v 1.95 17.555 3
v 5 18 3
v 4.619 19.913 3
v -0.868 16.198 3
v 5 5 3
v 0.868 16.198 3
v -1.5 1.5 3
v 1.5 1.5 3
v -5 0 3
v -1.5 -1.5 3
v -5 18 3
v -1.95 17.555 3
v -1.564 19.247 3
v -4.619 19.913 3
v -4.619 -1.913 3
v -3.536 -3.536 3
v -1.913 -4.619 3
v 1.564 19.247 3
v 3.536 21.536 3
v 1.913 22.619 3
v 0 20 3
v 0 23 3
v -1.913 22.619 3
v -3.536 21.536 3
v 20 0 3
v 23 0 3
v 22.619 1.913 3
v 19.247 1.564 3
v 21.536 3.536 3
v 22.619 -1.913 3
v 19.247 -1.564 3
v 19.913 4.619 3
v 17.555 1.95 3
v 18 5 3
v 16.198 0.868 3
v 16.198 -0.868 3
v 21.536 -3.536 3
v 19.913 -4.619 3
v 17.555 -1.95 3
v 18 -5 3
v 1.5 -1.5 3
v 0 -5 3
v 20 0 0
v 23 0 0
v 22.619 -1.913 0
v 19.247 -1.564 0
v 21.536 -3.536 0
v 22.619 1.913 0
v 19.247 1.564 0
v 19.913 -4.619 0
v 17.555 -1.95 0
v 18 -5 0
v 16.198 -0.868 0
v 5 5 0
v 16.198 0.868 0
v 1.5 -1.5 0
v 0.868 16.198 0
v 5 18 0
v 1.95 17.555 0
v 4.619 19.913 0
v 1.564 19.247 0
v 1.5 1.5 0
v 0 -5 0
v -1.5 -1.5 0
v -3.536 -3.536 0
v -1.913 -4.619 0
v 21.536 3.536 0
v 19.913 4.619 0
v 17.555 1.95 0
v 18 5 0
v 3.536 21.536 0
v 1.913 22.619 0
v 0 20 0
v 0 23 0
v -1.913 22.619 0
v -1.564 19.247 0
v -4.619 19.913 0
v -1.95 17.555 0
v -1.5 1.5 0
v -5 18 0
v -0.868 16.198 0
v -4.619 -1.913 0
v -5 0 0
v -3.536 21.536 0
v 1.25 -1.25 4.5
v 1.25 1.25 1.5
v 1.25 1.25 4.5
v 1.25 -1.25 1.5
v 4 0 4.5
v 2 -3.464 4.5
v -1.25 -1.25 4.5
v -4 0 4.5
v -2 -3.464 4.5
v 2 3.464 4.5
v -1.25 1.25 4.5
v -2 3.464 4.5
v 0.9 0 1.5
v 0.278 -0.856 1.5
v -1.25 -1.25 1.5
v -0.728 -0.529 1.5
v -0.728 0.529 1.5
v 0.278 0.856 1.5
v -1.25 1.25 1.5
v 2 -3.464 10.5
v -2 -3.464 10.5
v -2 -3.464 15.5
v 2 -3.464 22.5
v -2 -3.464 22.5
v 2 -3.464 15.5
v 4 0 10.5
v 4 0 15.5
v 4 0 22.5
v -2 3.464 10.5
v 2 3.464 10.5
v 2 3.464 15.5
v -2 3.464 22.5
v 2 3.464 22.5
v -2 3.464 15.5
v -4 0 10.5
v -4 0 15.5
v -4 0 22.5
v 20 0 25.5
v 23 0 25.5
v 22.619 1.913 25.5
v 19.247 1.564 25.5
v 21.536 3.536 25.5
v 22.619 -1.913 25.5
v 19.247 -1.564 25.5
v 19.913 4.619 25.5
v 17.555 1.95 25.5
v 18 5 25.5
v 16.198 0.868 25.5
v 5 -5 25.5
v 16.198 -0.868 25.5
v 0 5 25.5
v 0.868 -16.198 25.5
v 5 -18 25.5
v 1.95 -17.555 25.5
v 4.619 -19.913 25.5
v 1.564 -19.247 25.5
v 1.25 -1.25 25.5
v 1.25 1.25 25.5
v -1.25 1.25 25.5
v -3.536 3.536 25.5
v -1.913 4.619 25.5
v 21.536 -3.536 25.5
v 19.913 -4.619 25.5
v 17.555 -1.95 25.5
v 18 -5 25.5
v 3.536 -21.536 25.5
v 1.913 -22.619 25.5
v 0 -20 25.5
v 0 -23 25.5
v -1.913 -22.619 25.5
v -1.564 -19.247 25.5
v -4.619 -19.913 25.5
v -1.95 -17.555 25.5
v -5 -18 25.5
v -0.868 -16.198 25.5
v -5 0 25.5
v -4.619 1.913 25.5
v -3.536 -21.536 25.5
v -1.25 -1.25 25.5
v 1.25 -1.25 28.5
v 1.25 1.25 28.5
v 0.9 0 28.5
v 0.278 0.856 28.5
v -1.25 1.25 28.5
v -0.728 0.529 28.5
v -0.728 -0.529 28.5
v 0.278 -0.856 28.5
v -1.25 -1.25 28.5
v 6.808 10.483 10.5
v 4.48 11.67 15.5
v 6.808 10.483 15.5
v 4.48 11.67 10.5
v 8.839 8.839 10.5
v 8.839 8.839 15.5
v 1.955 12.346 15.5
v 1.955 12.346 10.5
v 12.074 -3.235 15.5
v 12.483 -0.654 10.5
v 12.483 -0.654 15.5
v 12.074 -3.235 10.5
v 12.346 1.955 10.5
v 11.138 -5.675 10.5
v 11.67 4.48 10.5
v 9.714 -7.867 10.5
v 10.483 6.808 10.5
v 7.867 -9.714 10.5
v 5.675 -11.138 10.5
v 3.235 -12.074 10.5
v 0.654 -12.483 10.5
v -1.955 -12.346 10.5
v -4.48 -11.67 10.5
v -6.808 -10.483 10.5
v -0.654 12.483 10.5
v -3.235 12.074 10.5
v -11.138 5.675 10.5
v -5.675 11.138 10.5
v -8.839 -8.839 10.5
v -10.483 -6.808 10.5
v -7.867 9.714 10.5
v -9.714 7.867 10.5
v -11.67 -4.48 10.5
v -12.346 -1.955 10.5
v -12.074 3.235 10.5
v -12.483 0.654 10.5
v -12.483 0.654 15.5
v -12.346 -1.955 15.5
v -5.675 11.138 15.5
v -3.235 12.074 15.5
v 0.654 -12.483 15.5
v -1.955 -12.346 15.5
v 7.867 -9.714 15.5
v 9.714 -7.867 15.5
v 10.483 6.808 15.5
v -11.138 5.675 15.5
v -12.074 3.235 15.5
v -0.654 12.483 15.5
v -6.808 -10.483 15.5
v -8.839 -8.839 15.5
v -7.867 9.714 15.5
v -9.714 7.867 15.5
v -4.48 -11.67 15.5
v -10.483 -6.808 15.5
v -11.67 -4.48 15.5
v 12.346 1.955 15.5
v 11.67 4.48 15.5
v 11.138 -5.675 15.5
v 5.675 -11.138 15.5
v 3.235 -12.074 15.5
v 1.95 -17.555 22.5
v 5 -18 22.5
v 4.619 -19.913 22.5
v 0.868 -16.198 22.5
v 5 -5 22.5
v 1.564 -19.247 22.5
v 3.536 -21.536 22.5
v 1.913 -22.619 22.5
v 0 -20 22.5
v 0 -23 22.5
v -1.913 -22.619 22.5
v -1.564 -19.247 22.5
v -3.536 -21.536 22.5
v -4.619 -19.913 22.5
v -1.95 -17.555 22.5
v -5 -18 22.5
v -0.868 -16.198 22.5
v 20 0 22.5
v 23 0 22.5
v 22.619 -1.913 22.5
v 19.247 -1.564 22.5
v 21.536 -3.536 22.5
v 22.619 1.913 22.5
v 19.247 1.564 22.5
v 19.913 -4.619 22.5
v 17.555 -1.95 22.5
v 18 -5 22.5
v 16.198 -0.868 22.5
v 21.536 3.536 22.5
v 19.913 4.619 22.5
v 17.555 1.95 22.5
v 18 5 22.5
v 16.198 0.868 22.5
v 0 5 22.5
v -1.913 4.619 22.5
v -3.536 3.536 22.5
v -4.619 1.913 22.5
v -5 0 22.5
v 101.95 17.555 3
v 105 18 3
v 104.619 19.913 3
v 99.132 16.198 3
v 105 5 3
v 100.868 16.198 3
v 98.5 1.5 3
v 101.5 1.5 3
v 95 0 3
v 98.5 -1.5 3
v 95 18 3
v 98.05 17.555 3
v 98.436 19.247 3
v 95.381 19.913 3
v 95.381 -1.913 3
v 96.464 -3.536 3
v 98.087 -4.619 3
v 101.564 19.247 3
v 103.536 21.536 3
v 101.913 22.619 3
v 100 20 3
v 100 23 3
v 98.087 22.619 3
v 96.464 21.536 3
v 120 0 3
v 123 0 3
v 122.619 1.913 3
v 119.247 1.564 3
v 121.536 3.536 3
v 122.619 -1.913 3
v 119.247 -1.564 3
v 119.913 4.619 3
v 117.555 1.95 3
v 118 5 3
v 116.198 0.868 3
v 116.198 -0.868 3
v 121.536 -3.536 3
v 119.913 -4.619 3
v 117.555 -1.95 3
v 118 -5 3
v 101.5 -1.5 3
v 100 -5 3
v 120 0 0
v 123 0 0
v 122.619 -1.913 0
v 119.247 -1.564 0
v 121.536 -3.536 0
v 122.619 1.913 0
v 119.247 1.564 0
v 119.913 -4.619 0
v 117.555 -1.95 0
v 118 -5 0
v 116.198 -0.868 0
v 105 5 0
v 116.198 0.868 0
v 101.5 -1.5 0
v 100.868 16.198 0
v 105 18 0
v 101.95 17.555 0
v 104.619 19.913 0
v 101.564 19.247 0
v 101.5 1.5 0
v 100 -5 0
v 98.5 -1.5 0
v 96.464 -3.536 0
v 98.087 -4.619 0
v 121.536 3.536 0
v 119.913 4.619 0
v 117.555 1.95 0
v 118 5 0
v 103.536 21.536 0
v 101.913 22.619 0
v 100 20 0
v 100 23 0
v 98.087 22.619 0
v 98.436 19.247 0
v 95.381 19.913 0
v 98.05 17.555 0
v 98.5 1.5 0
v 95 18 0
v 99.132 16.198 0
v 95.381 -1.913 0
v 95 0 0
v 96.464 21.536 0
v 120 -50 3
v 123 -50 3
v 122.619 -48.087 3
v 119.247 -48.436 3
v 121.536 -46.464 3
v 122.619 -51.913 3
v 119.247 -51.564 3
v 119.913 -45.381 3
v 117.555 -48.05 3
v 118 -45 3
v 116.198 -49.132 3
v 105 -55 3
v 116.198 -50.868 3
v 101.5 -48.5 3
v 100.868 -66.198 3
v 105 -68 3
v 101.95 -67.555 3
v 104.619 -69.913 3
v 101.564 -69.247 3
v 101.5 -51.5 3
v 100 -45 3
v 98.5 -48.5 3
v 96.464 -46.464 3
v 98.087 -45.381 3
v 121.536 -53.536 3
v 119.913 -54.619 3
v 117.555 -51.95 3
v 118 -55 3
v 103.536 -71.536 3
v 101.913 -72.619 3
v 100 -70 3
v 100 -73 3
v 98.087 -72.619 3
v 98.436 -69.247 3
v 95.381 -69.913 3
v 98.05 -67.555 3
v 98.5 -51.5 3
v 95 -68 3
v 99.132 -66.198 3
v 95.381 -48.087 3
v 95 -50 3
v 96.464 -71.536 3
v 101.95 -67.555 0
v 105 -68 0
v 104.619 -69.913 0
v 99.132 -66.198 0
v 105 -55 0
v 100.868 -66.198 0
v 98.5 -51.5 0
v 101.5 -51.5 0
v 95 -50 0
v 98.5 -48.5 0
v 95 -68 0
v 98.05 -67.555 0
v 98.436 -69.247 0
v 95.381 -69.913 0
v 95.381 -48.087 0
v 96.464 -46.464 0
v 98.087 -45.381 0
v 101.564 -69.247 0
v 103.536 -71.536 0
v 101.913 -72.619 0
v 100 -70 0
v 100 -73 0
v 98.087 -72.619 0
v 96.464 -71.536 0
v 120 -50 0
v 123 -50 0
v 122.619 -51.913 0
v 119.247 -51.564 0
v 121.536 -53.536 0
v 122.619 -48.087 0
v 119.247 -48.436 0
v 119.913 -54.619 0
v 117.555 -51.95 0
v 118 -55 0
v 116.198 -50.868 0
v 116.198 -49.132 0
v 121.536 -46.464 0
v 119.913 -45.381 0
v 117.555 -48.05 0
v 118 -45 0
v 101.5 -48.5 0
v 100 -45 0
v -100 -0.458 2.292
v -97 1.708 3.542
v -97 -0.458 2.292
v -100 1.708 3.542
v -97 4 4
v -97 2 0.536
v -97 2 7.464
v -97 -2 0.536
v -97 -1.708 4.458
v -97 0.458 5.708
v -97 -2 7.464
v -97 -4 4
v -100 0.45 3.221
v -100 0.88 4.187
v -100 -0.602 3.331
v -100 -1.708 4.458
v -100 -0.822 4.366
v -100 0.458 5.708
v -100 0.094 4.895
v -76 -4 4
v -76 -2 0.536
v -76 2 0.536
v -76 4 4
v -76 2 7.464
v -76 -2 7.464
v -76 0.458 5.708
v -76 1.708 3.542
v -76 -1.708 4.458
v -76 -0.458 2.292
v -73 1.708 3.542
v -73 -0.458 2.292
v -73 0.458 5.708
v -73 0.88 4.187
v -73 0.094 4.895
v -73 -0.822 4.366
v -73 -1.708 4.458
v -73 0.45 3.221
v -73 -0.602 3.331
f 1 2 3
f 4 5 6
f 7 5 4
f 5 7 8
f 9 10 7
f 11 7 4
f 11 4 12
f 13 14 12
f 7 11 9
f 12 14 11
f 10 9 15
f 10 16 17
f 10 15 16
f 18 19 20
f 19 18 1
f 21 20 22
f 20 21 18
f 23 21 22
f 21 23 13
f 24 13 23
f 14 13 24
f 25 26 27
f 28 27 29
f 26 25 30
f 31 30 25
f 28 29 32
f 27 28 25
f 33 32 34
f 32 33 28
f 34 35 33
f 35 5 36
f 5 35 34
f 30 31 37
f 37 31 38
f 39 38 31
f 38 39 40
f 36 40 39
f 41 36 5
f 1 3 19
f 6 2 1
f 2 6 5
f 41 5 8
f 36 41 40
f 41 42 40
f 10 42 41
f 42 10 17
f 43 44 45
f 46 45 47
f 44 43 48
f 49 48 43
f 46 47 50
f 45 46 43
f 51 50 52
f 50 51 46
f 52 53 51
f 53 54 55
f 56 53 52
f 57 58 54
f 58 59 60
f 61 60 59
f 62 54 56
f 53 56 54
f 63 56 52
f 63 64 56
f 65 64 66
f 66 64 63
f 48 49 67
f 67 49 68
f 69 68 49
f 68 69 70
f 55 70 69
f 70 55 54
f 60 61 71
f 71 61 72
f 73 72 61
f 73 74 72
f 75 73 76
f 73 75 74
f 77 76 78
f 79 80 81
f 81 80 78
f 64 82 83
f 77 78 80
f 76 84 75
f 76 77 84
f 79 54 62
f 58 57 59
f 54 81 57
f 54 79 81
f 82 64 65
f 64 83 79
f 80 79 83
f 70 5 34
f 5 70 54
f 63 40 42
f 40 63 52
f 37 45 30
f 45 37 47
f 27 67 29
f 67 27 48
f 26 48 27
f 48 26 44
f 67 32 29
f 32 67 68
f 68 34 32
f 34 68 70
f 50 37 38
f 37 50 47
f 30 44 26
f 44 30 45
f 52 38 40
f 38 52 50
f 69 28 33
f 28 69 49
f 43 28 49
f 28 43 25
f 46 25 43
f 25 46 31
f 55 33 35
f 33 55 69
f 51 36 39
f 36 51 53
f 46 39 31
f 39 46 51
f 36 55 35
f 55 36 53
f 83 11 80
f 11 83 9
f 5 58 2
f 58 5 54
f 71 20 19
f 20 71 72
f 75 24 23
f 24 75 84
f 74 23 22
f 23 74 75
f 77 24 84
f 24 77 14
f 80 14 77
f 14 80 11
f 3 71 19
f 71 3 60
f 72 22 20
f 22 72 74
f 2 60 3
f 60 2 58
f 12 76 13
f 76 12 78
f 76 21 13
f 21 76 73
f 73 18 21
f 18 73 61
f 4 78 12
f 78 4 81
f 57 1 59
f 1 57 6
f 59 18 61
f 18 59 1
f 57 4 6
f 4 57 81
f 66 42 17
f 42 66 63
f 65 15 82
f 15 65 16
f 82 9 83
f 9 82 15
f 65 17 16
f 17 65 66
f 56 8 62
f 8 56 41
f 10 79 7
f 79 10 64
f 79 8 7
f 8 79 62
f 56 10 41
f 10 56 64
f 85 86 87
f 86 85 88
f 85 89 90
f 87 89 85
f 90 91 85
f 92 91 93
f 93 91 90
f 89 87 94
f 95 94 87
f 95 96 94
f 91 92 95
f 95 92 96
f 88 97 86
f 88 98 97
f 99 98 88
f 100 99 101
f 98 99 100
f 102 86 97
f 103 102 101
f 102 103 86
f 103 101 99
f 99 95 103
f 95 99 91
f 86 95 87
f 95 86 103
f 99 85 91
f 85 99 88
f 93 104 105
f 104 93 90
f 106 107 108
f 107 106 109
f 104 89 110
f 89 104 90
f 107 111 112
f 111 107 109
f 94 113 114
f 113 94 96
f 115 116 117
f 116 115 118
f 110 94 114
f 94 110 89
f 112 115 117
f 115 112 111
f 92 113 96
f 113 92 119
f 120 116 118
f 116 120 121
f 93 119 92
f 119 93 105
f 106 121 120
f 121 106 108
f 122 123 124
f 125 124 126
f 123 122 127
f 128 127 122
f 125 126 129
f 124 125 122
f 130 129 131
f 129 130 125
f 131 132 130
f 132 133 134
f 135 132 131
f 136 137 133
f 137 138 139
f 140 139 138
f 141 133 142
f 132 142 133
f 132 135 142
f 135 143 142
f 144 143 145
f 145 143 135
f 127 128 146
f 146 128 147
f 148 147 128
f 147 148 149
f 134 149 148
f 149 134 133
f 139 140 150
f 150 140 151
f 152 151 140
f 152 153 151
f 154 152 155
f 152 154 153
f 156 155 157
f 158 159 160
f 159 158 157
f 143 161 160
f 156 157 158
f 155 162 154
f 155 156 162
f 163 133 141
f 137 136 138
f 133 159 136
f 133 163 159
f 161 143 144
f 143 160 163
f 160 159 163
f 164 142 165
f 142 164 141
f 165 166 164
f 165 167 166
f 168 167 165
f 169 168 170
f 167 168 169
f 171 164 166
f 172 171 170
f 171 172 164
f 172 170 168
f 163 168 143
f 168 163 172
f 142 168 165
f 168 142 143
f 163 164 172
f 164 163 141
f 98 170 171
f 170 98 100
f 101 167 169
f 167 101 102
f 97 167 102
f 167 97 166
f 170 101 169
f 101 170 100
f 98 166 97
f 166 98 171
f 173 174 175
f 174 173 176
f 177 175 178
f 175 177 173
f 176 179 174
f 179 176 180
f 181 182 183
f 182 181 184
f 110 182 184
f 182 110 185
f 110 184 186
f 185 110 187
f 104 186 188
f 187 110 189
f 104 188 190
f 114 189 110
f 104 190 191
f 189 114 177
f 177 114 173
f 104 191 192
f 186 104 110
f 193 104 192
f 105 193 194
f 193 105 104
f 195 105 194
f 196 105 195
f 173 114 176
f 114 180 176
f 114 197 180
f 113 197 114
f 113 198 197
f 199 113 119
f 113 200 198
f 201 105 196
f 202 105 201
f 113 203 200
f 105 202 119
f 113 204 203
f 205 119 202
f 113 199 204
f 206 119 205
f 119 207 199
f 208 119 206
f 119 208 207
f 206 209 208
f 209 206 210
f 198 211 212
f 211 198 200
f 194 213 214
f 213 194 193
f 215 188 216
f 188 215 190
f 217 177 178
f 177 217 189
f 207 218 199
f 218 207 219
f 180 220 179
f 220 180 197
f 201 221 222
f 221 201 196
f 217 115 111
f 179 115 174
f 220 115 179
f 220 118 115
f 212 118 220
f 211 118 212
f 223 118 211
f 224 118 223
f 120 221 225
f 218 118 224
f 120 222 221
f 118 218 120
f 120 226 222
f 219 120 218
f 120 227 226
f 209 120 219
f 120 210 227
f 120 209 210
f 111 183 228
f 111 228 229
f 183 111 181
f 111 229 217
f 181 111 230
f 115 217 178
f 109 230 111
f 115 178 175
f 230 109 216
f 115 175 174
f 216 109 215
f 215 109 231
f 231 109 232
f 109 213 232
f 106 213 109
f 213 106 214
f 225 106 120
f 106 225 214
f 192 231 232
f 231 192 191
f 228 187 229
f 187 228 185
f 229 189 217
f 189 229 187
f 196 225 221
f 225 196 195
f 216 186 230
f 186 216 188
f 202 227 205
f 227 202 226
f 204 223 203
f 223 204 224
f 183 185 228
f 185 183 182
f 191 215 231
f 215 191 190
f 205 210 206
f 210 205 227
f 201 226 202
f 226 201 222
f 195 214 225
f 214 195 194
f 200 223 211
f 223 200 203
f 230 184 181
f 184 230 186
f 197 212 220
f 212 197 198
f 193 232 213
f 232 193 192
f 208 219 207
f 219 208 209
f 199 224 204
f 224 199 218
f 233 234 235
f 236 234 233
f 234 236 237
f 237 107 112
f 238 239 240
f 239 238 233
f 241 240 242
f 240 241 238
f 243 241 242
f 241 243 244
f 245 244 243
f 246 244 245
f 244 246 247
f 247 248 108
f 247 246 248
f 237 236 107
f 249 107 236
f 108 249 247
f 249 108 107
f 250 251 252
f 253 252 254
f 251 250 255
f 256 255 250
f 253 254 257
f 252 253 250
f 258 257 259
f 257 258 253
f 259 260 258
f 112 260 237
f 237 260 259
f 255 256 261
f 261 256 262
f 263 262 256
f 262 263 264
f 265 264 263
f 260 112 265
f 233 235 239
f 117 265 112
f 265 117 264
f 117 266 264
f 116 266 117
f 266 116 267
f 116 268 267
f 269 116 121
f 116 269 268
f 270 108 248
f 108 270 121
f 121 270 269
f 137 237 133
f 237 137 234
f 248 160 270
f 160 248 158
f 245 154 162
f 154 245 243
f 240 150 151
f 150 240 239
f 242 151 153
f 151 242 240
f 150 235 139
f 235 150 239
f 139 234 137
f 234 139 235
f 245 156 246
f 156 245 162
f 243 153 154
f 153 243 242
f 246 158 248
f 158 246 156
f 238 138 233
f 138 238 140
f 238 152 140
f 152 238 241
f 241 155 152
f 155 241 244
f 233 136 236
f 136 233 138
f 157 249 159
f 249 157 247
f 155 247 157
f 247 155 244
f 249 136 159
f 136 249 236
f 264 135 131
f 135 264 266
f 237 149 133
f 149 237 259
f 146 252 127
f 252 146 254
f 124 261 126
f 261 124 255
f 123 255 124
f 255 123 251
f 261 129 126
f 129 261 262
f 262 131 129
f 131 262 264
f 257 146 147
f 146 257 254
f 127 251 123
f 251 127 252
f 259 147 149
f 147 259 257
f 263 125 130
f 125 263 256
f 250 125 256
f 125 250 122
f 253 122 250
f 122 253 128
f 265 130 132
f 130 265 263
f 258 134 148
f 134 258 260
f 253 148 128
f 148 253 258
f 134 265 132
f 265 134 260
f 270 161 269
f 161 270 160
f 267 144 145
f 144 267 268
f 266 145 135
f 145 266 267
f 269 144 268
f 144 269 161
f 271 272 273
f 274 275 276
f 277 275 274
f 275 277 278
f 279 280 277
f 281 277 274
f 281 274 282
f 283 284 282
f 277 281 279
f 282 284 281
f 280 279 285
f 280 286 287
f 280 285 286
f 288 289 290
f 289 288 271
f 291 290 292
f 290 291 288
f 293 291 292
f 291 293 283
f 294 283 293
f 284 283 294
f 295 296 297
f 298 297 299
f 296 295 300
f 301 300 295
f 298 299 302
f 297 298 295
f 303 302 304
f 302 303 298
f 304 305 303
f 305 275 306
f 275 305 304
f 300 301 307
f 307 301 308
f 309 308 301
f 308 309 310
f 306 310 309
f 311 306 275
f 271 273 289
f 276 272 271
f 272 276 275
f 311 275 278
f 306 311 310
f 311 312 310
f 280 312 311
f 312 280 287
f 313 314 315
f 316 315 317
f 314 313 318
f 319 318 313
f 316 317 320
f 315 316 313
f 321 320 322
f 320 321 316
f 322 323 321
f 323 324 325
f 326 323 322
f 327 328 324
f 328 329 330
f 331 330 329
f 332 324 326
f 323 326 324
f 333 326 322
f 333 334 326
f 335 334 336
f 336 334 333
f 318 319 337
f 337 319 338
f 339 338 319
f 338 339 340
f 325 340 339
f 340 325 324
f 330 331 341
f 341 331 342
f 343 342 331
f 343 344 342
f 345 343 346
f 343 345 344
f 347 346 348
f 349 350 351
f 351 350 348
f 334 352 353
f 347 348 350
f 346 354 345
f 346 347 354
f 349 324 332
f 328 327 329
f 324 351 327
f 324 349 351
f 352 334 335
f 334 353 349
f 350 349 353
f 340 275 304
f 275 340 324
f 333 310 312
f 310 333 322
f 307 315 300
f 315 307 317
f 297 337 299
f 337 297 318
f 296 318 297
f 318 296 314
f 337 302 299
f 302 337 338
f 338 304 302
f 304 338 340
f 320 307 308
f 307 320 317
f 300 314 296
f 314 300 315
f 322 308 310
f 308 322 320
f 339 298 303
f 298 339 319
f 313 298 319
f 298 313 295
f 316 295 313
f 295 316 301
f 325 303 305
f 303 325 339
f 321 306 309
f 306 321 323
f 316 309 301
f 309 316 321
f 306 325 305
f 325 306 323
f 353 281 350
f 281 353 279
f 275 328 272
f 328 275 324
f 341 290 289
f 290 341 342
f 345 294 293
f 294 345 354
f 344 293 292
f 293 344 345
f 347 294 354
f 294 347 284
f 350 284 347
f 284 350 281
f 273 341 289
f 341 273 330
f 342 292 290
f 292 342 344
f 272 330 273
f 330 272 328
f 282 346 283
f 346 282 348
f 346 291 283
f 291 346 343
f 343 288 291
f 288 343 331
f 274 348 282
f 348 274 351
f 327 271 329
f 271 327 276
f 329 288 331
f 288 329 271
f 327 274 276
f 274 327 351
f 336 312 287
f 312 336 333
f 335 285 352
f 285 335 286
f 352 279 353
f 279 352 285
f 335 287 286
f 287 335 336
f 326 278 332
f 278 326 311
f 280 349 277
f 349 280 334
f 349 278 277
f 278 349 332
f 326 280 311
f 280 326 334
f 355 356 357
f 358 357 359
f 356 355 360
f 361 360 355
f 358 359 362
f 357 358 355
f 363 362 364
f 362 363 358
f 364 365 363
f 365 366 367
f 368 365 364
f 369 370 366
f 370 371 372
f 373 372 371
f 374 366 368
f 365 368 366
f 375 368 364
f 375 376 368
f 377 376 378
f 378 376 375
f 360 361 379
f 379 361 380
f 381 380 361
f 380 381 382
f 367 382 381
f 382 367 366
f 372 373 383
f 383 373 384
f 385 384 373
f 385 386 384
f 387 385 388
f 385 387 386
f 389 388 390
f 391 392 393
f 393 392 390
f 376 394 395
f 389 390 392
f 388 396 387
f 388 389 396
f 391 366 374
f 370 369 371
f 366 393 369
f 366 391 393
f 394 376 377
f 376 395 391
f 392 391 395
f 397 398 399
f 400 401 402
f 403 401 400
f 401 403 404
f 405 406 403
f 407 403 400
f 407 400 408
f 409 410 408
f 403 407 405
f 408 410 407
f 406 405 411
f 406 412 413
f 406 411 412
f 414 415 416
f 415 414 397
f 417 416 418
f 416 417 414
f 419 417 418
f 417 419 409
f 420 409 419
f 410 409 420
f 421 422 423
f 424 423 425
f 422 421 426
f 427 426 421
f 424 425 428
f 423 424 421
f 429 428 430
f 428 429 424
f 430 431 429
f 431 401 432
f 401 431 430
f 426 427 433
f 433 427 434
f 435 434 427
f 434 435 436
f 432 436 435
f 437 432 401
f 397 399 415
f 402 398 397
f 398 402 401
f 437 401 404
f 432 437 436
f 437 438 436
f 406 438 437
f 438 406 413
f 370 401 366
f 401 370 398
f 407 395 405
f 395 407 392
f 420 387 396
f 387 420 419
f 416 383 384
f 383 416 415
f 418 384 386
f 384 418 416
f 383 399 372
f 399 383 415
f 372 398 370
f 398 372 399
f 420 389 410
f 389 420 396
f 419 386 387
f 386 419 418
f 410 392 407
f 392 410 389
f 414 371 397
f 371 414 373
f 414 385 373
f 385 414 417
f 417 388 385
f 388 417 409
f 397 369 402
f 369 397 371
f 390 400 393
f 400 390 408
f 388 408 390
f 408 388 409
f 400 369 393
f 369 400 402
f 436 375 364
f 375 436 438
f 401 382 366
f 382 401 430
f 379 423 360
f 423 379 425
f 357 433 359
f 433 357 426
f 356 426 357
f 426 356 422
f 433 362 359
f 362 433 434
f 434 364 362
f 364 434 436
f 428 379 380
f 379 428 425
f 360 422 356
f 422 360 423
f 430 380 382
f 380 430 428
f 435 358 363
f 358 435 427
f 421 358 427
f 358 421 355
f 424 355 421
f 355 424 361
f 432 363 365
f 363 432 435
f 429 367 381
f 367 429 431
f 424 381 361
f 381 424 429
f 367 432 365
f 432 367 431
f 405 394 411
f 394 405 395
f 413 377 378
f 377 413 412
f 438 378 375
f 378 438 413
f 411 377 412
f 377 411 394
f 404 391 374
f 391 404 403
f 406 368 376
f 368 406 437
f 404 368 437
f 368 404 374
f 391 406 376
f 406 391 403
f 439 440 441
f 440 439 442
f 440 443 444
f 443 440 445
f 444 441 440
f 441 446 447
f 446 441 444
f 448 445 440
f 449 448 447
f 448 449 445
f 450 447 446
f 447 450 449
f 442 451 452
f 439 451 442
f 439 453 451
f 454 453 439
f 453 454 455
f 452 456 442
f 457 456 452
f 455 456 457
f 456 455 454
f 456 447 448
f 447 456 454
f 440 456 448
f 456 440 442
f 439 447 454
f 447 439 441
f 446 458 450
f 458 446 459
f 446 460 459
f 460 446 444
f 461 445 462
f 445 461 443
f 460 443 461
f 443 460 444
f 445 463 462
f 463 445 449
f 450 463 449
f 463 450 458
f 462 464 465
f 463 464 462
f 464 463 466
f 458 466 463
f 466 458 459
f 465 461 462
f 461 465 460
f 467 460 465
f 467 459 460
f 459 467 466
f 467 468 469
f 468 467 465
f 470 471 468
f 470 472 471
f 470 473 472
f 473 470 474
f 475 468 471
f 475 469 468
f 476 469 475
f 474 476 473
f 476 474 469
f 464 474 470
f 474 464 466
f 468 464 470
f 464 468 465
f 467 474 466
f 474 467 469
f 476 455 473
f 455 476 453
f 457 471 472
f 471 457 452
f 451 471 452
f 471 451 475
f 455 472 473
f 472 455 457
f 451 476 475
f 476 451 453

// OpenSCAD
// file: ModuleKatzenklappe.scad
// //////////////////////////////////
// Module für Katzenklappenverschluss
// //////////////////////////////////

module armHorn (laenge, breite, dicke) {
    difference() {
    union() {
    translate ([0,-breite/2,0])
    cube([laenge,breite,dicke], false);
    translate ([laenge,0,0])
    cylinder(dicke,r=breite/2, false); 
    }
    translate ([laenge*1.0,0,0])
    loch(radius=2,tiefe= dicke + 1);
/*    translate ([laenge*0.6,0,dicke-1])
    letter("Achim");
    translate ([laenge*0.6,0,1])
    rotate([0,180,0])
    letter("Tim");
    translate ([laenge*0.2,0,0])
    loch(radius=2,tiefe= dicke + 1);
*/    }
};

module mittelRad (breite) {
    difference() {
        cylinder(breite,r=12.5, false);
        cylinder(breite,r=2.0, false);
        
/*        translate([0,0,breite])
        gear (
            toothNo = 100, 
            toothWidth = 1, 
            toothHeight  = 2, 
            thickness = breite,
            holeRadius = 5,
            holeSides = 6
        );
        translate ([-25,0,0])
        loch(radius=5,tiefe=breite + 1);
        translate ([25,0,0])
        loch(radius=5,tiefe=breite + 1);
        translate ([0,-25,0])
        loch(radius=5,tiefe=breite + 1);
        translate ([0,25,0])
        loch(radius=5,tiefe=breite + 1);
*/        } 
};

module loch (radius, tiefe) {
        cylinder(tiefe,r=radius, false);   
};

module zapfen (breite,tiefe) {
        cube([breite,breite,tiefe], true);   
};

module wand (breite) {
    difference() {
        cube([breite,120,5], false);  
        translate ([5,5,0])
        cube([breite/3-10,110,5], false);  
        translate ([breite/3+5,5,0])
        cube([breite/3-10,110,5], false);  
        translate ([2*breite/3+5,5,0])
        cube([breite/3-10,110,5], false);  
    } 
};

module lArm(laenge, breite, dicke) {
    difference() {
        union() {
            armHorn(laenge=laenge, breite=breite, dicke=dicke);
            rotate(90) armHorn(laenge=laenge, breite=breite, dicke=dicke);
            cylinder(dicke,r=breite/2, false); 
           }
            translate ([0,0,0])
            zapfen(breite= 3, tiefe = dicke * 2);
        }
};

module mittelAchse(laenge, radius_achse, zapfen_breite, zapfen_laenge, breite) {
    difference() {
        union() {
            translate ([0,0,zapfen_laenge /2])
            zapfen(breite= zapfen_breite, tiefe=zapfen_laenge);   
            translate ([0,0,zapfen_laenge])
            cylinder(laenge,r = radius_achse, false, $fn=6);
            translate ([0,0,laenge+(1.5*zapfen_laenge)])
            zapfen(breite= zapfen_breite, tiefe=zapfen_laenge);   
        }
        cylinder (laenge+6,r=0.9, false);
    }
};

module achse(laenge, radius_achse) {
    difference() {
        cylinder(laenge,r = radius_achse, false, $fn=6);
        cylinder (laenge+6,r=0.9, false);
    }
};


module tooth(width, thickness, height){
  scale([width/5,thickness/5,height/10]){
    difference(){
      translate([-2.5,0,0])
      cube([5,5,10]);
      translate([5+1.25-2.5,0-1,0])
      rotate([0,-14.0362434,0])
        cube([5,5+2,12]);
      translate([0-1.25-2.5,0+5+1,0])
      rotate([0,-14.0362434,180])
        cube([5,5+2,12]);
    }
  }
}
module gear(toothNo, toothWidth, toothHeight, thickness,holeRadius,holeSides){
  radius = (toothWidth*1.7*toothNo)/3.141592653589793238/2;
  rotate([-90,0,0])
  difference(){
    union(){
      for(i=[0:toothNo]){
        rotate([0,(360/toothNo)*i,0])
        translate([0,0,radius-0.5])
          tooth(toothWidth,thickness,toothHeight);
      }
      translate([0,thickness,0])
      rotate([90,0,0])
        cylinder(r=radius, h=thickness);
    }
  translate([0,thickness+1,0])
  rotate([90,0,0])
    cylinder(r=holeRadius,h=thickness+2,$fn=holeSides);
  }
}

font = "Liberation Sans";


letter_size = 5;
letter_height = 3;


module letter(l) {
  // Use linear_extrude() to make the letters 3D objects as they
  // are only 2D shapes when only using text()
  linear_extrude(height = letter_height) {
    text(l, size = letter_size, font = font, halign = "center", valign = "center", $fn = 16);
  }
}


module 9g_motor(){
	difference(){			
		union(){
			color("SteelBlue") cube([23,12.5,22], center=true);
			color("SteelBlue") translate([0,0,5]) cube([32,12,2], center=true);
			color("SteelBlue") translate([5.5,0,2.75]) cylinder(r=6, h=25.75, $fn=20, center=true);
			color("SteelBlue") translate([-.5,0,2.75]) cylinder(r=1, h=25.75, $fn=20, center=true);
			color("SteelBlue") translate([-1,0,2.75]) cube([5,5.6,24.5], center=true);		
			color("white") translate([5.5,0,3.65]) cylinder(r=2.35, h=29.25, $fn=20, center=true);				
		}
		translate([10,0,-11]) rotate([0,-30,0]) cube([8,13,4], center=true);
		for ( hole = [14,-14] ){
			translate([hole,0,5]) cylinder(r=2.2, h=4, $fn=20, center=true);
		}	
	}
}

module sg90() {
	color("blue") difference() {
		union() {
			translate([0,0,22.5/2]) cube([22.5,12.2,22.5], center=true);
			translate([0,0,16.75]) cube([32.2,12.2,2], center=true);

			translate([0,0,22.5-1]) {
				hull() {
					translate([-1,0,0]) cylinder(d=5.5, h=4+1);
					translate([1,0,0]) cylinder(d=5.5, h=4+1);
				}

				translate([5.5,0,0]) cylinder(d=11.6, h=4+1);
			}

		}	

		translate([-32.5/2+2,0,16.75-2]) {
			cylinder(d=2, h=2+2);
			translate([-2,0,2]) cube([4,1,2+2], center=true);
		}
		translate([32.5/2-2,0,16.75-2]) {
			cylinder(d=2, h=2+2);
			translate([2,0,2]) cube([4,1,2+2], center=true);
		}
	}
	color("white") translate([5.5,0,22.5-1+4]) {
		difference() {
			cylinder(d=4.8, h=3+1);
			translate([0,0,1]) cylinder(d=2, h=4);
		}
	}
}

module stuetze (hoehe) {
    difference() {
        translate ([0,0,0])
        cube([hoehe,20,3], false);
        translate ([hoehe*0.8,10,0])
        cylinder(21,r=1.5, center=true);
        translate ([hoehe*0.7,10,0])
        cylinder(21,r=1.5, center=true);
        translate ([hoehe*0.6,10,0])
        cylinder(21,r=1.5, center=true);
        translate ([hoehe*0.5,10,0])
        cylinder(21,r=1.5, center=true);
    }
}

module balken (laenge) {
    difference() {
        translate ([0,-10,0])
        cube([5,laenge,3], false);
    }
/*    translate ([2.5,25,2.5])
        rotate(-90,90,0)
        letter("Design by Achim & Tim 2018");    
*/
}

module boden(laenge, breite) {
    difference() {
        cube([5,laenge,breite], false);
        rotate([0,90,0])
        translate ([-breite/2,laenge*0.1,0])
        cylinder(6,r=1.5, center=false);
        rotate([0,90,0])
        translate ([-breite/2,laenge*0.5,0])
        cylinder(6,r=1.5, center=false);
        rotate([0,90,0])
        translate ([-breite/2,laenge*0.9,0])
        cylinder(6,r=1.5, center=false);
    }
}

module wand(hoehe, anzahl, abstand) {
    for (a =[0:abstand:anzahl*abstand])
        translate ([0,a,0])
        stuetze(hoehe);
    translate ([0,10,0])
    balken(anzahl*abstand);
    translate ([hoehe-5,10,0])
    balken(anzahl*abstand);
}

module halterung(hoehe) {
    // Bodenplatte
    cube([5,22,36],false);
    difference(){
        // Motorhalterung
        cube([hoehe,22,15.5],false);
        translate ([hoehe-5,10,11])
        cylinder(6,r=0.5, center=false);
        translate ([10,10,11])
        cylinder(6,r=0.5, center=false);
    }
}
// main file
include <ModuleKatzenklappe.scad>;
//$fn = 40;

// Maße eines L-Arms
lArmBreite  = 10;
lArmLaenge  = 18;
lArmDicke   = 3;

// Maße der Mittelachse
mittelAchseLaenge       = 21;
mittelAchseRadius       = 4;
mittelAchseZapfenBreite = 2.5;
mittelAchseZapfenLaenge = 3;
mittelAchseRadBreite    = 5;

union() {

        // Verschlussriegel unten
        lArm(laenge=lArmLaenge,breite=lArmBreite,dicke=lArmDicke);

        translate([0,0,lArmDicke/2])
        // Mittelachse
        mittelAchse(laenge = mittelAchseLaenge, radius_achse = mittelAchseRadius, zapfen_breite = mittelAchseZapfenBreite, zapfen_laenge = mittelAchseZapfenLaenge, breite = mittelAchseRadBreite);

        // Antrieb in der Mitte
        translate([0,0,(mittelAchseLaenge / 2)]) 
        rotate(45) mittelRad(mittelAchseRadBreite);
            
        // Verschlussriegel oben
        translate ([0,0,mittelAchseLaenge++lArmDicke/2])
        rotate(-90) lArm(laenge=lArmLaenge,breite=lArmBreite,dicke=lArmDicke);
}

// Arm links
translate ([100,0,0])
lArm(laenge=lArmLaenge,breite=lArmBreite,dicke=lArmDicke);

// Arm rechts
translate ([100,-50,0])
rotate(-90) lArm(laenge=lArmLaenge,breite=lArmBreite,dicke=lArmDicke);

// Achse
translate ([-100,0,mittelAchseRadius])
rotate([0,90,0])
rotate([0,0,30])
mittelAchse(laenge = mittelAchseLaenge, radius_achse = mittelAchseRadius, zapfen_breite = mittelAchseZapfenBreite, zapfen_laenge = mittelAchseZapfenLaenge, breite = mittelAchseRadBreite);




// Mittelrad
//translate([0,100,0])
//mittelRad(mittelAchseRadBreite);

/*
translate ([-200,200,0])
gear (
	toothNo = 25, 
    toothWidth = 5, 
    toothHeight  = 10, 
    thickness = 20,
    holeRadius = 5,
    holeSides = 6
);
*/
